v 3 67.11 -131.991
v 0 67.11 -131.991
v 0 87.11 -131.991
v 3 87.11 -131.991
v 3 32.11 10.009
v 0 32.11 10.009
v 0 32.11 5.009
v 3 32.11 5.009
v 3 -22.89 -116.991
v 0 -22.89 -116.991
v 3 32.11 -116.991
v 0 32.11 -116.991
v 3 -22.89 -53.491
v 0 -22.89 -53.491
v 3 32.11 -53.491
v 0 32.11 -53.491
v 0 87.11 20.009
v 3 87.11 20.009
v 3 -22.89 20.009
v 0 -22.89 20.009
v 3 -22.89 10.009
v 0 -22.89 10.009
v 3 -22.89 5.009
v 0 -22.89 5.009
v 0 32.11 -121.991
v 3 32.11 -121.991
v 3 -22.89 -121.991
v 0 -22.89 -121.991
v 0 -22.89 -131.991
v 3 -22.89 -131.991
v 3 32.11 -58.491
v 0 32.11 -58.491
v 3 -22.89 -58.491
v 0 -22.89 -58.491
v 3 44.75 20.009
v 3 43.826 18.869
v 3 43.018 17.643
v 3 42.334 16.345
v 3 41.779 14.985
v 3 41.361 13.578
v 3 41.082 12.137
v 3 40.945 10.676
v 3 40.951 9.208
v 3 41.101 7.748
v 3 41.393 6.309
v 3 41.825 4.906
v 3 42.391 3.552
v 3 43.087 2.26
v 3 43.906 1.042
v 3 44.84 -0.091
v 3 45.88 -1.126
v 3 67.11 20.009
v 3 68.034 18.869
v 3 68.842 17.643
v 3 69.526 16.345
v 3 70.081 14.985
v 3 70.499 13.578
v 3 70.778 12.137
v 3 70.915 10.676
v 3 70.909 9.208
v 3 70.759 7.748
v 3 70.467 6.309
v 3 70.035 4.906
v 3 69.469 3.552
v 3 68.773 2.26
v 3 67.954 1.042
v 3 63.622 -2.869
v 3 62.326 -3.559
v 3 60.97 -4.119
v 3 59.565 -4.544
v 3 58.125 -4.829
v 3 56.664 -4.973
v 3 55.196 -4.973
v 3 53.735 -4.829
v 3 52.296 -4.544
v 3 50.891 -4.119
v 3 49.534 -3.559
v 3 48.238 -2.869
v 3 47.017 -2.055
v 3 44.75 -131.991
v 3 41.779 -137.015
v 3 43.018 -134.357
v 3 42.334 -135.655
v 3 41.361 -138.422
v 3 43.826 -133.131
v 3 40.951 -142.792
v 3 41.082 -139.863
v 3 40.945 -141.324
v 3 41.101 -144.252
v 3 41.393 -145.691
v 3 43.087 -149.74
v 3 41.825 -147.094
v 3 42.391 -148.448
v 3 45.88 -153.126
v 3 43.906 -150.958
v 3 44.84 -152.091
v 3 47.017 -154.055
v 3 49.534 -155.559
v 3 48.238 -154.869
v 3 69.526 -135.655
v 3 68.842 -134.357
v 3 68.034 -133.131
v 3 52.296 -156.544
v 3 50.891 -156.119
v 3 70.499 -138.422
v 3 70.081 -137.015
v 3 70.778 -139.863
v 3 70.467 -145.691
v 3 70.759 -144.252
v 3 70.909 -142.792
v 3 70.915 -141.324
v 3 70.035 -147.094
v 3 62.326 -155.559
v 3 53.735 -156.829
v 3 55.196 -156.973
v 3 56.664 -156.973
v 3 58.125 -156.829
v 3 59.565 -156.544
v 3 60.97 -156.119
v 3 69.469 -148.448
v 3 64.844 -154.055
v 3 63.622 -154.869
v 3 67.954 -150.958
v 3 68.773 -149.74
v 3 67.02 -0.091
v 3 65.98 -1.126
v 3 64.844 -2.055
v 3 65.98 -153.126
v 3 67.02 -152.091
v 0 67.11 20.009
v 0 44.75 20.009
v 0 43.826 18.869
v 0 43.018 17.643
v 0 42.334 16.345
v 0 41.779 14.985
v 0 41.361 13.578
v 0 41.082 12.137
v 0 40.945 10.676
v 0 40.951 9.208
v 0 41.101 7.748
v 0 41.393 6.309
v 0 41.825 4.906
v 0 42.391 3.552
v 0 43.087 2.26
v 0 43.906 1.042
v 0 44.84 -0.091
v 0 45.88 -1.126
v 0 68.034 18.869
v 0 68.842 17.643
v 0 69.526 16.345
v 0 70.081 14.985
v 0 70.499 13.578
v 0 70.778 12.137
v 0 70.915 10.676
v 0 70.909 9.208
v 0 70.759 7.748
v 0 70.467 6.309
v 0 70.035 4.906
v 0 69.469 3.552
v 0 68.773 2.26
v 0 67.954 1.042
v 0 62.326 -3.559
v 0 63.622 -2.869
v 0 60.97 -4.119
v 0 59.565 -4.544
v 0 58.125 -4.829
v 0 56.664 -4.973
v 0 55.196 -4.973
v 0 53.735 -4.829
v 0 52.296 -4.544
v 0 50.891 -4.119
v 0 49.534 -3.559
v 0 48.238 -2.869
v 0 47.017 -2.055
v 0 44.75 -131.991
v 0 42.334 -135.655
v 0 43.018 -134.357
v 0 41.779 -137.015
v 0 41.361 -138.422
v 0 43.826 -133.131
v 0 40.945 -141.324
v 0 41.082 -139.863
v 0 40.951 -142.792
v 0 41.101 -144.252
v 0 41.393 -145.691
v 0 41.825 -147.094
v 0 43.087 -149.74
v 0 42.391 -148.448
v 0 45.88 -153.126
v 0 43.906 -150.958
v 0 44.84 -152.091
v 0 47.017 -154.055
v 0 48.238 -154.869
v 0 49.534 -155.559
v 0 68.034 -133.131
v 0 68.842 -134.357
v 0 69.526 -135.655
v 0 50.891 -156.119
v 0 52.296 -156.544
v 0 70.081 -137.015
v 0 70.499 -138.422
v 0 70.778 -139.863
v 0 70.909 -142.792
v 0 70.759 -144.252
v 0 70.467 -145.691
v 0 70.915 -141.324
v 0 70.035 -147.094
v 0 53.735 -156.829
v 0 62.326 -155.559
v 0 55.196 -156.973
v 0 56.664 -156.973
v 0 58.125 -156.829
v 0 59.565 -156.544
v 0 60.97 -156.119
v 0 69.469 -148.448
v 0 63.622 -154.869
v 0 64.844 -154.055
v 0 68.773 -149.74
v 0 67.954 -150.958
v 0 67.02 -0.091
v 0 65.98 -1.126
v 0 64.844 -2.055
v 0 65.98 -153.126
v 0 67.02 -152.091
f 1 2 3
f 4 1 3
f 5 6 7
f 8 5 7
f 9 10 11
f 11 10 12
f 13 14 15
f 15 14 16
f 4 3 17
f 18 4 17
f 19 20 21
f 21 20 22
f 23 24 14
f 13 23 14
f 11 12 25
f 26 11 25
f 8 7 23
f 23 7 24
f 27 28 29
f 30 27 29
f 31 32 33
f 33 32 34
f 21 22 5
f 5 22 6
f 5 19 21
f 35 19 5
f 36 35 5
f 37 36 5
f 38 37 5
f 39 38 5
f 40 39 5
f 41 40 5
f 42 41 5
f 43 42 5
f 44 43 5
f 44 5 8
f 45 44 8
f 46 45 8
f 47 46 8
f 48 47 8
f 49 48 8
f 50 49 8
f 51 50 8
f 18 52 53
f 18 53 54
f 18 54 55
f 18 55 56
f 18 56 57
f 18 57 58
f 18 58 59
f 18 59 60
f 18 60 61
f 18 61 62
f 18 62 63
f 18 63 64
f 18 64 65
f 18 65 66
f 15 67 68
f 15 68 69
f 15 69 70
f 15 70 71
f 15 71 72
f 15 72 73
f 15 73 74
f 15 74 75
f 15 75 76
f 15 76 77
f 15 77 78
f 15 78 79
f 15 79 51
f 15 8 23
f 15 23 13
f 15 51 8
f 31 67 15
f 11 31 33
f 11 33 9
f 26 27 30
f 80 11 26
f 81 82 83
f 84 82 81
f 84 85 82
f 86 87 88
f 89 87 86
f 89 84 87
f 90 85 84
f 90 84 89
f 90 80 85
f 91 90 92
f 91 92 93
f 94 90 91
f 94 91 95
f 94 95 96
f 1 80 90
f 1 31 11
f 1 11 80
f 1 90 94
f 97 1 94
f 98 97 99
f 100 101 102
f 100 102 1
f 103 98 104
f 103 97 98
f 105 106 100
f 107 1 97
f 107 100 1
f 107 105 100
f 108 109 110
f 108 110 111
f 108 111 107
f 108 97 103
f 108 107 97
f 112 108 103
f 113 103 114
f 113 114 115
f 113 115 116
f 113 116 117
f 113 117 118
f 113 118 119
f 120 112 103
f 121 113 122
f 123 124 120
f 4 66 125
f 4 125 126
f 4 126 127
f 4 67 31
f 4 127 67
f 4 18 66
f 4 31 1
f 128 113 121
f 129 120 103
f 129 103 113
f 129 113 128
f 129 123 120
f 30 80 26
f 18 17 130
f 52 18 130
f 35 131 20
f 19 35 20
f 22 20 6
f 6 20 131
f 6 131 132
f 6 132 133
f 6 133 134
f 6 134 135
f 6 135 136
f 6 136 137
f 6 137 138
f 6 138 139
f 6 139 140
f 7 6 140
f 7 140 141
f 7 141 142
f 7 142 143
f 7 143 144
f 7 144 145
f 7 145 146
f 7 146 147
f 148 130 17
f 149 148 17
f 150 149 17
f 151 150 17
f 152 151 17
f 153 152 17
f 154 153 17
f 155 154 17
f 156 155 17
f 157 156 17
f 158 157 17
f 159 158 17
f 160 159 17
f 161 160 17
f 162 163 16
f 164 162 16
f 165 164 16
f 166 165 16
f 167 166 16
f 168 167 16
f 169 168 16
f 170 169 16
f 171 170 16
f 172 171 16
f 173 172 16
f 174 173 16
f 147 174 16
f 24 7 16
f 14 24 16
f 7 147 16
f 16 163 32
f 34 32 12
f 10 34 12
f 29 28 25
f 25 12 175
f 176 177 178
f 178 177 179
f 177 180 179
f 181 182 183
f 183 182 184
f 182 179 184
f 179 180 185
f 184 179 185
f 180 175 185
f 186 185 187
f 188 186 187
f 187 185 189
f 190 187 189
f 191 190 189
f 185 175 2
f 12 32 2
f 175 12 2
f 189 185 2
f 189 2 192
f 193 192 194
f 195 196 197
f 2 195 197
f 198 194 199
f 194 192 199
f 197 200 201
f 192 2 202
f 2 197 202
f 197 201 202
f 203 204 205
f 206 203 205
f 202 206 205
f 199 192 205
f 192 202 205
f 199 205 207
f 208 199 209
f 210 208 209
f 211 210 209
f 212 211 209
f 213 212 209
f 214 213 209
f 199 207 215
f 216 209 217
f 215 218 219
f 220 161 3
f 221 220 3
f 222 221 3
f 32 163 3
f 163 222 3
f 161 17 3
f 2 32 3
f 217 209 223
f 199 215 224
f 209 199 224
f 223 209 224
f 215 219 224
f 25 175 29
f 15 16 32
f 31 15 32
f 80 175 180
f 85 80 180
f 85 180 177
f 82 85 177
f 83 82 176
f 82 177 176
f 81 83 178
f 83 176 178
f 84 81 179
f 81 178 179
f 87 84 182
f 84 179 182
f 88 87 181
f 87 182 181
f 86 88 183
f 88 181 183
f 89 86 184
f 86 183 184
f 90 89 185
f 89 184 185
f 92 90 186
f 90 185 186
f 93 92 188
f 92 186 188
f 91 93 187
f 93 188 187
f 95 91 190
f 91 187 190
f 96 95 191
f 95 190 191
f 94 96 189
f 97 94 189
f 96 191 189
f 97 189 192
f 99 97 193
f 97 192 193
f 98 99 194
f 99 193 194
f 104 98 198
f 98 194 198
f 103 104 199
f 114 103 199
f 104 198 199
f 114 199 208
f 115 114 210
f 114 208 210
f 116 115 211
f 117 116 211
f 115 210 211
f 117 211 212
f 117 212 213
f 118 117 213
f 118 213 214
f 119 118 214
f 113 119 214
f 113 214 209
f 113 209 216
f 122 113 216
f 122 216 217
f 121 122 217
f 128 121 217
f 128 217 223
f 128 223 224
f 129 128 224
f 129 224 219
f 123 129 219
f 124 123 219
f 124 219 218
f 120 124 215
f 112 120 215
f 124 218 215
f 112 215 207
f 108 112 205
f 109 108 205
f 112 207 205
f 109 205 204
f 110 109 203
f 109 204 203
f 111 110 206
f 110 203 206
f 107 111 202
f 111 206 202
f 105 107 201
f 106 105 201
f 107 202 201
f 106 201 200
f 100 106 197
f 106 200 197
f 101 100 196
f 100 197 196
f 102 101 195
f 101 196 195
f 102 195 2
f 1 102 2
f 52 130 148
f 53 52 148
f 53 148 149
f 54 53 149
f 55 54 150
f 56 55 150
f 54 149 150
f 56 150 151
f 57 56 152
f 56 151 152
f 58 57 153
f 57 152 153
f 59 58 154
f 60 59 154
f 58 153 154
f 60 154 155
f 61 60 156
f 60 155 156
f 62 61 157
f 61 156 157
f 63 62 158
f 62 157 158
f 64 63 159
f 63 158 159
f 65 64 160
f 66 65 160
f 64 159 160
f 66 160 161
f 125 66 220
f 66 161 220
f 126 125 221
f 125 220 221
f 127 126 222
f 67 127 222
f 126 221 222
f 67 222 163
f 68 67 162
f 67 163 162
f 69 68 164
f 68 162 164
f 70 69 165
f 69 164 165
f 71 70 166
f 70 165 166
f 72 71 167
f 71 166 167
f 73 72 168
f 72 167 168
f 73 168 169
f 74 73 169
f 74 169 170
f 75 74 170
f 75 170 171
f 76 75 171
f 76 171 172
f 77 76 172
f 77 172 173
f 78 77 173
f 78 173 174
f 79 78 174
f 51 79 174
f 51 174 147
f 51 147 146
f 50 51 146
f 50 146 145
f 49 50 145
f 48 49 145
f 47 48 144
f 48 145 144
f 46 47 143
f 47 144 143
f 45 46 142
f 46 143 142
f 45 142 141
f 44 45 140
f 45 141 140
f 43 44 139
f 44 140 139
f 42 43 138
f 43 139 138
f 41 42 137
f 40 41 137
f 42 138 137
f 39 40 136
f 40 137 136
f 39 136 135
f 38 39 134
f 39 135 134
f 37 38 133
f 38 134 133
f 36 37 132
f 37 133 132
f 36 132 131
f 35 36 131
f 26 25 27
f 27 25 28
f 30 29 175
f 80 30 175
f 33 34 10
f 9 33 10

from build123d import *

# Parameters (mm, degrees)
BOSS_EXTRU_1_DEPTH = 3


with BuildPart() as part:
    # Esquisse2 → Boss.-Extru.1 (new body)
    with BuildSketch(Plane(origin=(0, 0, -25.32076404), x_dir=(0, 0, -1), z_dir=(1, 0, 0))):
        with BuildLine():
            Line((-45.329923666, 87.110380525), (-45.329923666, 67.110380525))
            ThreePointArc((-45.329923666, 67.110380525), (-20.329923666, 55.930040637), (-45.329923666, 44.74970075))
            Line((-45.329923666, 44.74970075), (-45.329923666, -22.889619475))
            Line((-45.329923666, -22.889619475), (-35.329923666, -22.889619475))
            Line((-35.329923666, -22.889619475), (-35.329923666, 32.110380525))
            Line((-35.329923666, 32.110380525), (-30.329923666, 32.110380525))
            Line((-30.329923666, 32.110380525), (-30.329923666, -22.889619475))
            Line((-30.329923666, -22.889619475), (28.170076334, -22.889619475))
            Line((28.170076334, -22.889619475), (28.170076334, 32.110380525))
            Line((28.170076334, 32.110380525), (33.170076334, 32.110380525))
            Line((33.170076334, 32.110380525), (33.170076334, -22.889619475))
            Line((33.170076334, -22.889619475), (91.670076334, -22.889619475))
            Line((91.670076334, -22.889619475), (91.670076334, 32.110380525))
            Line((91.670076334, 32.110380525), (96.670076334, 32.110380525))
            Line((96.670076334, 32.110380525), (96.670076334, -22.889619475))
            Line((96.670076334, -22.889619475), (106.670076334, -22.889619475))
            Line((106.670076334, -22.889619475), (106.670076334, 44.74970075))
            ThreePointArc((106.670076334, 44.74970075), (131.670076334, 55.930040637), (106.670076334, 67.110380525))
            Line((106.670076334, 67.110380525), (106.670076334, 87.110380525))
            Line((106.670076334, 87.110380525), (-45.329923666, 87.110380525))
        make_face()
    extrude(amount=BOSS_EXTRU_1_DEPTH)


solid = part.part
